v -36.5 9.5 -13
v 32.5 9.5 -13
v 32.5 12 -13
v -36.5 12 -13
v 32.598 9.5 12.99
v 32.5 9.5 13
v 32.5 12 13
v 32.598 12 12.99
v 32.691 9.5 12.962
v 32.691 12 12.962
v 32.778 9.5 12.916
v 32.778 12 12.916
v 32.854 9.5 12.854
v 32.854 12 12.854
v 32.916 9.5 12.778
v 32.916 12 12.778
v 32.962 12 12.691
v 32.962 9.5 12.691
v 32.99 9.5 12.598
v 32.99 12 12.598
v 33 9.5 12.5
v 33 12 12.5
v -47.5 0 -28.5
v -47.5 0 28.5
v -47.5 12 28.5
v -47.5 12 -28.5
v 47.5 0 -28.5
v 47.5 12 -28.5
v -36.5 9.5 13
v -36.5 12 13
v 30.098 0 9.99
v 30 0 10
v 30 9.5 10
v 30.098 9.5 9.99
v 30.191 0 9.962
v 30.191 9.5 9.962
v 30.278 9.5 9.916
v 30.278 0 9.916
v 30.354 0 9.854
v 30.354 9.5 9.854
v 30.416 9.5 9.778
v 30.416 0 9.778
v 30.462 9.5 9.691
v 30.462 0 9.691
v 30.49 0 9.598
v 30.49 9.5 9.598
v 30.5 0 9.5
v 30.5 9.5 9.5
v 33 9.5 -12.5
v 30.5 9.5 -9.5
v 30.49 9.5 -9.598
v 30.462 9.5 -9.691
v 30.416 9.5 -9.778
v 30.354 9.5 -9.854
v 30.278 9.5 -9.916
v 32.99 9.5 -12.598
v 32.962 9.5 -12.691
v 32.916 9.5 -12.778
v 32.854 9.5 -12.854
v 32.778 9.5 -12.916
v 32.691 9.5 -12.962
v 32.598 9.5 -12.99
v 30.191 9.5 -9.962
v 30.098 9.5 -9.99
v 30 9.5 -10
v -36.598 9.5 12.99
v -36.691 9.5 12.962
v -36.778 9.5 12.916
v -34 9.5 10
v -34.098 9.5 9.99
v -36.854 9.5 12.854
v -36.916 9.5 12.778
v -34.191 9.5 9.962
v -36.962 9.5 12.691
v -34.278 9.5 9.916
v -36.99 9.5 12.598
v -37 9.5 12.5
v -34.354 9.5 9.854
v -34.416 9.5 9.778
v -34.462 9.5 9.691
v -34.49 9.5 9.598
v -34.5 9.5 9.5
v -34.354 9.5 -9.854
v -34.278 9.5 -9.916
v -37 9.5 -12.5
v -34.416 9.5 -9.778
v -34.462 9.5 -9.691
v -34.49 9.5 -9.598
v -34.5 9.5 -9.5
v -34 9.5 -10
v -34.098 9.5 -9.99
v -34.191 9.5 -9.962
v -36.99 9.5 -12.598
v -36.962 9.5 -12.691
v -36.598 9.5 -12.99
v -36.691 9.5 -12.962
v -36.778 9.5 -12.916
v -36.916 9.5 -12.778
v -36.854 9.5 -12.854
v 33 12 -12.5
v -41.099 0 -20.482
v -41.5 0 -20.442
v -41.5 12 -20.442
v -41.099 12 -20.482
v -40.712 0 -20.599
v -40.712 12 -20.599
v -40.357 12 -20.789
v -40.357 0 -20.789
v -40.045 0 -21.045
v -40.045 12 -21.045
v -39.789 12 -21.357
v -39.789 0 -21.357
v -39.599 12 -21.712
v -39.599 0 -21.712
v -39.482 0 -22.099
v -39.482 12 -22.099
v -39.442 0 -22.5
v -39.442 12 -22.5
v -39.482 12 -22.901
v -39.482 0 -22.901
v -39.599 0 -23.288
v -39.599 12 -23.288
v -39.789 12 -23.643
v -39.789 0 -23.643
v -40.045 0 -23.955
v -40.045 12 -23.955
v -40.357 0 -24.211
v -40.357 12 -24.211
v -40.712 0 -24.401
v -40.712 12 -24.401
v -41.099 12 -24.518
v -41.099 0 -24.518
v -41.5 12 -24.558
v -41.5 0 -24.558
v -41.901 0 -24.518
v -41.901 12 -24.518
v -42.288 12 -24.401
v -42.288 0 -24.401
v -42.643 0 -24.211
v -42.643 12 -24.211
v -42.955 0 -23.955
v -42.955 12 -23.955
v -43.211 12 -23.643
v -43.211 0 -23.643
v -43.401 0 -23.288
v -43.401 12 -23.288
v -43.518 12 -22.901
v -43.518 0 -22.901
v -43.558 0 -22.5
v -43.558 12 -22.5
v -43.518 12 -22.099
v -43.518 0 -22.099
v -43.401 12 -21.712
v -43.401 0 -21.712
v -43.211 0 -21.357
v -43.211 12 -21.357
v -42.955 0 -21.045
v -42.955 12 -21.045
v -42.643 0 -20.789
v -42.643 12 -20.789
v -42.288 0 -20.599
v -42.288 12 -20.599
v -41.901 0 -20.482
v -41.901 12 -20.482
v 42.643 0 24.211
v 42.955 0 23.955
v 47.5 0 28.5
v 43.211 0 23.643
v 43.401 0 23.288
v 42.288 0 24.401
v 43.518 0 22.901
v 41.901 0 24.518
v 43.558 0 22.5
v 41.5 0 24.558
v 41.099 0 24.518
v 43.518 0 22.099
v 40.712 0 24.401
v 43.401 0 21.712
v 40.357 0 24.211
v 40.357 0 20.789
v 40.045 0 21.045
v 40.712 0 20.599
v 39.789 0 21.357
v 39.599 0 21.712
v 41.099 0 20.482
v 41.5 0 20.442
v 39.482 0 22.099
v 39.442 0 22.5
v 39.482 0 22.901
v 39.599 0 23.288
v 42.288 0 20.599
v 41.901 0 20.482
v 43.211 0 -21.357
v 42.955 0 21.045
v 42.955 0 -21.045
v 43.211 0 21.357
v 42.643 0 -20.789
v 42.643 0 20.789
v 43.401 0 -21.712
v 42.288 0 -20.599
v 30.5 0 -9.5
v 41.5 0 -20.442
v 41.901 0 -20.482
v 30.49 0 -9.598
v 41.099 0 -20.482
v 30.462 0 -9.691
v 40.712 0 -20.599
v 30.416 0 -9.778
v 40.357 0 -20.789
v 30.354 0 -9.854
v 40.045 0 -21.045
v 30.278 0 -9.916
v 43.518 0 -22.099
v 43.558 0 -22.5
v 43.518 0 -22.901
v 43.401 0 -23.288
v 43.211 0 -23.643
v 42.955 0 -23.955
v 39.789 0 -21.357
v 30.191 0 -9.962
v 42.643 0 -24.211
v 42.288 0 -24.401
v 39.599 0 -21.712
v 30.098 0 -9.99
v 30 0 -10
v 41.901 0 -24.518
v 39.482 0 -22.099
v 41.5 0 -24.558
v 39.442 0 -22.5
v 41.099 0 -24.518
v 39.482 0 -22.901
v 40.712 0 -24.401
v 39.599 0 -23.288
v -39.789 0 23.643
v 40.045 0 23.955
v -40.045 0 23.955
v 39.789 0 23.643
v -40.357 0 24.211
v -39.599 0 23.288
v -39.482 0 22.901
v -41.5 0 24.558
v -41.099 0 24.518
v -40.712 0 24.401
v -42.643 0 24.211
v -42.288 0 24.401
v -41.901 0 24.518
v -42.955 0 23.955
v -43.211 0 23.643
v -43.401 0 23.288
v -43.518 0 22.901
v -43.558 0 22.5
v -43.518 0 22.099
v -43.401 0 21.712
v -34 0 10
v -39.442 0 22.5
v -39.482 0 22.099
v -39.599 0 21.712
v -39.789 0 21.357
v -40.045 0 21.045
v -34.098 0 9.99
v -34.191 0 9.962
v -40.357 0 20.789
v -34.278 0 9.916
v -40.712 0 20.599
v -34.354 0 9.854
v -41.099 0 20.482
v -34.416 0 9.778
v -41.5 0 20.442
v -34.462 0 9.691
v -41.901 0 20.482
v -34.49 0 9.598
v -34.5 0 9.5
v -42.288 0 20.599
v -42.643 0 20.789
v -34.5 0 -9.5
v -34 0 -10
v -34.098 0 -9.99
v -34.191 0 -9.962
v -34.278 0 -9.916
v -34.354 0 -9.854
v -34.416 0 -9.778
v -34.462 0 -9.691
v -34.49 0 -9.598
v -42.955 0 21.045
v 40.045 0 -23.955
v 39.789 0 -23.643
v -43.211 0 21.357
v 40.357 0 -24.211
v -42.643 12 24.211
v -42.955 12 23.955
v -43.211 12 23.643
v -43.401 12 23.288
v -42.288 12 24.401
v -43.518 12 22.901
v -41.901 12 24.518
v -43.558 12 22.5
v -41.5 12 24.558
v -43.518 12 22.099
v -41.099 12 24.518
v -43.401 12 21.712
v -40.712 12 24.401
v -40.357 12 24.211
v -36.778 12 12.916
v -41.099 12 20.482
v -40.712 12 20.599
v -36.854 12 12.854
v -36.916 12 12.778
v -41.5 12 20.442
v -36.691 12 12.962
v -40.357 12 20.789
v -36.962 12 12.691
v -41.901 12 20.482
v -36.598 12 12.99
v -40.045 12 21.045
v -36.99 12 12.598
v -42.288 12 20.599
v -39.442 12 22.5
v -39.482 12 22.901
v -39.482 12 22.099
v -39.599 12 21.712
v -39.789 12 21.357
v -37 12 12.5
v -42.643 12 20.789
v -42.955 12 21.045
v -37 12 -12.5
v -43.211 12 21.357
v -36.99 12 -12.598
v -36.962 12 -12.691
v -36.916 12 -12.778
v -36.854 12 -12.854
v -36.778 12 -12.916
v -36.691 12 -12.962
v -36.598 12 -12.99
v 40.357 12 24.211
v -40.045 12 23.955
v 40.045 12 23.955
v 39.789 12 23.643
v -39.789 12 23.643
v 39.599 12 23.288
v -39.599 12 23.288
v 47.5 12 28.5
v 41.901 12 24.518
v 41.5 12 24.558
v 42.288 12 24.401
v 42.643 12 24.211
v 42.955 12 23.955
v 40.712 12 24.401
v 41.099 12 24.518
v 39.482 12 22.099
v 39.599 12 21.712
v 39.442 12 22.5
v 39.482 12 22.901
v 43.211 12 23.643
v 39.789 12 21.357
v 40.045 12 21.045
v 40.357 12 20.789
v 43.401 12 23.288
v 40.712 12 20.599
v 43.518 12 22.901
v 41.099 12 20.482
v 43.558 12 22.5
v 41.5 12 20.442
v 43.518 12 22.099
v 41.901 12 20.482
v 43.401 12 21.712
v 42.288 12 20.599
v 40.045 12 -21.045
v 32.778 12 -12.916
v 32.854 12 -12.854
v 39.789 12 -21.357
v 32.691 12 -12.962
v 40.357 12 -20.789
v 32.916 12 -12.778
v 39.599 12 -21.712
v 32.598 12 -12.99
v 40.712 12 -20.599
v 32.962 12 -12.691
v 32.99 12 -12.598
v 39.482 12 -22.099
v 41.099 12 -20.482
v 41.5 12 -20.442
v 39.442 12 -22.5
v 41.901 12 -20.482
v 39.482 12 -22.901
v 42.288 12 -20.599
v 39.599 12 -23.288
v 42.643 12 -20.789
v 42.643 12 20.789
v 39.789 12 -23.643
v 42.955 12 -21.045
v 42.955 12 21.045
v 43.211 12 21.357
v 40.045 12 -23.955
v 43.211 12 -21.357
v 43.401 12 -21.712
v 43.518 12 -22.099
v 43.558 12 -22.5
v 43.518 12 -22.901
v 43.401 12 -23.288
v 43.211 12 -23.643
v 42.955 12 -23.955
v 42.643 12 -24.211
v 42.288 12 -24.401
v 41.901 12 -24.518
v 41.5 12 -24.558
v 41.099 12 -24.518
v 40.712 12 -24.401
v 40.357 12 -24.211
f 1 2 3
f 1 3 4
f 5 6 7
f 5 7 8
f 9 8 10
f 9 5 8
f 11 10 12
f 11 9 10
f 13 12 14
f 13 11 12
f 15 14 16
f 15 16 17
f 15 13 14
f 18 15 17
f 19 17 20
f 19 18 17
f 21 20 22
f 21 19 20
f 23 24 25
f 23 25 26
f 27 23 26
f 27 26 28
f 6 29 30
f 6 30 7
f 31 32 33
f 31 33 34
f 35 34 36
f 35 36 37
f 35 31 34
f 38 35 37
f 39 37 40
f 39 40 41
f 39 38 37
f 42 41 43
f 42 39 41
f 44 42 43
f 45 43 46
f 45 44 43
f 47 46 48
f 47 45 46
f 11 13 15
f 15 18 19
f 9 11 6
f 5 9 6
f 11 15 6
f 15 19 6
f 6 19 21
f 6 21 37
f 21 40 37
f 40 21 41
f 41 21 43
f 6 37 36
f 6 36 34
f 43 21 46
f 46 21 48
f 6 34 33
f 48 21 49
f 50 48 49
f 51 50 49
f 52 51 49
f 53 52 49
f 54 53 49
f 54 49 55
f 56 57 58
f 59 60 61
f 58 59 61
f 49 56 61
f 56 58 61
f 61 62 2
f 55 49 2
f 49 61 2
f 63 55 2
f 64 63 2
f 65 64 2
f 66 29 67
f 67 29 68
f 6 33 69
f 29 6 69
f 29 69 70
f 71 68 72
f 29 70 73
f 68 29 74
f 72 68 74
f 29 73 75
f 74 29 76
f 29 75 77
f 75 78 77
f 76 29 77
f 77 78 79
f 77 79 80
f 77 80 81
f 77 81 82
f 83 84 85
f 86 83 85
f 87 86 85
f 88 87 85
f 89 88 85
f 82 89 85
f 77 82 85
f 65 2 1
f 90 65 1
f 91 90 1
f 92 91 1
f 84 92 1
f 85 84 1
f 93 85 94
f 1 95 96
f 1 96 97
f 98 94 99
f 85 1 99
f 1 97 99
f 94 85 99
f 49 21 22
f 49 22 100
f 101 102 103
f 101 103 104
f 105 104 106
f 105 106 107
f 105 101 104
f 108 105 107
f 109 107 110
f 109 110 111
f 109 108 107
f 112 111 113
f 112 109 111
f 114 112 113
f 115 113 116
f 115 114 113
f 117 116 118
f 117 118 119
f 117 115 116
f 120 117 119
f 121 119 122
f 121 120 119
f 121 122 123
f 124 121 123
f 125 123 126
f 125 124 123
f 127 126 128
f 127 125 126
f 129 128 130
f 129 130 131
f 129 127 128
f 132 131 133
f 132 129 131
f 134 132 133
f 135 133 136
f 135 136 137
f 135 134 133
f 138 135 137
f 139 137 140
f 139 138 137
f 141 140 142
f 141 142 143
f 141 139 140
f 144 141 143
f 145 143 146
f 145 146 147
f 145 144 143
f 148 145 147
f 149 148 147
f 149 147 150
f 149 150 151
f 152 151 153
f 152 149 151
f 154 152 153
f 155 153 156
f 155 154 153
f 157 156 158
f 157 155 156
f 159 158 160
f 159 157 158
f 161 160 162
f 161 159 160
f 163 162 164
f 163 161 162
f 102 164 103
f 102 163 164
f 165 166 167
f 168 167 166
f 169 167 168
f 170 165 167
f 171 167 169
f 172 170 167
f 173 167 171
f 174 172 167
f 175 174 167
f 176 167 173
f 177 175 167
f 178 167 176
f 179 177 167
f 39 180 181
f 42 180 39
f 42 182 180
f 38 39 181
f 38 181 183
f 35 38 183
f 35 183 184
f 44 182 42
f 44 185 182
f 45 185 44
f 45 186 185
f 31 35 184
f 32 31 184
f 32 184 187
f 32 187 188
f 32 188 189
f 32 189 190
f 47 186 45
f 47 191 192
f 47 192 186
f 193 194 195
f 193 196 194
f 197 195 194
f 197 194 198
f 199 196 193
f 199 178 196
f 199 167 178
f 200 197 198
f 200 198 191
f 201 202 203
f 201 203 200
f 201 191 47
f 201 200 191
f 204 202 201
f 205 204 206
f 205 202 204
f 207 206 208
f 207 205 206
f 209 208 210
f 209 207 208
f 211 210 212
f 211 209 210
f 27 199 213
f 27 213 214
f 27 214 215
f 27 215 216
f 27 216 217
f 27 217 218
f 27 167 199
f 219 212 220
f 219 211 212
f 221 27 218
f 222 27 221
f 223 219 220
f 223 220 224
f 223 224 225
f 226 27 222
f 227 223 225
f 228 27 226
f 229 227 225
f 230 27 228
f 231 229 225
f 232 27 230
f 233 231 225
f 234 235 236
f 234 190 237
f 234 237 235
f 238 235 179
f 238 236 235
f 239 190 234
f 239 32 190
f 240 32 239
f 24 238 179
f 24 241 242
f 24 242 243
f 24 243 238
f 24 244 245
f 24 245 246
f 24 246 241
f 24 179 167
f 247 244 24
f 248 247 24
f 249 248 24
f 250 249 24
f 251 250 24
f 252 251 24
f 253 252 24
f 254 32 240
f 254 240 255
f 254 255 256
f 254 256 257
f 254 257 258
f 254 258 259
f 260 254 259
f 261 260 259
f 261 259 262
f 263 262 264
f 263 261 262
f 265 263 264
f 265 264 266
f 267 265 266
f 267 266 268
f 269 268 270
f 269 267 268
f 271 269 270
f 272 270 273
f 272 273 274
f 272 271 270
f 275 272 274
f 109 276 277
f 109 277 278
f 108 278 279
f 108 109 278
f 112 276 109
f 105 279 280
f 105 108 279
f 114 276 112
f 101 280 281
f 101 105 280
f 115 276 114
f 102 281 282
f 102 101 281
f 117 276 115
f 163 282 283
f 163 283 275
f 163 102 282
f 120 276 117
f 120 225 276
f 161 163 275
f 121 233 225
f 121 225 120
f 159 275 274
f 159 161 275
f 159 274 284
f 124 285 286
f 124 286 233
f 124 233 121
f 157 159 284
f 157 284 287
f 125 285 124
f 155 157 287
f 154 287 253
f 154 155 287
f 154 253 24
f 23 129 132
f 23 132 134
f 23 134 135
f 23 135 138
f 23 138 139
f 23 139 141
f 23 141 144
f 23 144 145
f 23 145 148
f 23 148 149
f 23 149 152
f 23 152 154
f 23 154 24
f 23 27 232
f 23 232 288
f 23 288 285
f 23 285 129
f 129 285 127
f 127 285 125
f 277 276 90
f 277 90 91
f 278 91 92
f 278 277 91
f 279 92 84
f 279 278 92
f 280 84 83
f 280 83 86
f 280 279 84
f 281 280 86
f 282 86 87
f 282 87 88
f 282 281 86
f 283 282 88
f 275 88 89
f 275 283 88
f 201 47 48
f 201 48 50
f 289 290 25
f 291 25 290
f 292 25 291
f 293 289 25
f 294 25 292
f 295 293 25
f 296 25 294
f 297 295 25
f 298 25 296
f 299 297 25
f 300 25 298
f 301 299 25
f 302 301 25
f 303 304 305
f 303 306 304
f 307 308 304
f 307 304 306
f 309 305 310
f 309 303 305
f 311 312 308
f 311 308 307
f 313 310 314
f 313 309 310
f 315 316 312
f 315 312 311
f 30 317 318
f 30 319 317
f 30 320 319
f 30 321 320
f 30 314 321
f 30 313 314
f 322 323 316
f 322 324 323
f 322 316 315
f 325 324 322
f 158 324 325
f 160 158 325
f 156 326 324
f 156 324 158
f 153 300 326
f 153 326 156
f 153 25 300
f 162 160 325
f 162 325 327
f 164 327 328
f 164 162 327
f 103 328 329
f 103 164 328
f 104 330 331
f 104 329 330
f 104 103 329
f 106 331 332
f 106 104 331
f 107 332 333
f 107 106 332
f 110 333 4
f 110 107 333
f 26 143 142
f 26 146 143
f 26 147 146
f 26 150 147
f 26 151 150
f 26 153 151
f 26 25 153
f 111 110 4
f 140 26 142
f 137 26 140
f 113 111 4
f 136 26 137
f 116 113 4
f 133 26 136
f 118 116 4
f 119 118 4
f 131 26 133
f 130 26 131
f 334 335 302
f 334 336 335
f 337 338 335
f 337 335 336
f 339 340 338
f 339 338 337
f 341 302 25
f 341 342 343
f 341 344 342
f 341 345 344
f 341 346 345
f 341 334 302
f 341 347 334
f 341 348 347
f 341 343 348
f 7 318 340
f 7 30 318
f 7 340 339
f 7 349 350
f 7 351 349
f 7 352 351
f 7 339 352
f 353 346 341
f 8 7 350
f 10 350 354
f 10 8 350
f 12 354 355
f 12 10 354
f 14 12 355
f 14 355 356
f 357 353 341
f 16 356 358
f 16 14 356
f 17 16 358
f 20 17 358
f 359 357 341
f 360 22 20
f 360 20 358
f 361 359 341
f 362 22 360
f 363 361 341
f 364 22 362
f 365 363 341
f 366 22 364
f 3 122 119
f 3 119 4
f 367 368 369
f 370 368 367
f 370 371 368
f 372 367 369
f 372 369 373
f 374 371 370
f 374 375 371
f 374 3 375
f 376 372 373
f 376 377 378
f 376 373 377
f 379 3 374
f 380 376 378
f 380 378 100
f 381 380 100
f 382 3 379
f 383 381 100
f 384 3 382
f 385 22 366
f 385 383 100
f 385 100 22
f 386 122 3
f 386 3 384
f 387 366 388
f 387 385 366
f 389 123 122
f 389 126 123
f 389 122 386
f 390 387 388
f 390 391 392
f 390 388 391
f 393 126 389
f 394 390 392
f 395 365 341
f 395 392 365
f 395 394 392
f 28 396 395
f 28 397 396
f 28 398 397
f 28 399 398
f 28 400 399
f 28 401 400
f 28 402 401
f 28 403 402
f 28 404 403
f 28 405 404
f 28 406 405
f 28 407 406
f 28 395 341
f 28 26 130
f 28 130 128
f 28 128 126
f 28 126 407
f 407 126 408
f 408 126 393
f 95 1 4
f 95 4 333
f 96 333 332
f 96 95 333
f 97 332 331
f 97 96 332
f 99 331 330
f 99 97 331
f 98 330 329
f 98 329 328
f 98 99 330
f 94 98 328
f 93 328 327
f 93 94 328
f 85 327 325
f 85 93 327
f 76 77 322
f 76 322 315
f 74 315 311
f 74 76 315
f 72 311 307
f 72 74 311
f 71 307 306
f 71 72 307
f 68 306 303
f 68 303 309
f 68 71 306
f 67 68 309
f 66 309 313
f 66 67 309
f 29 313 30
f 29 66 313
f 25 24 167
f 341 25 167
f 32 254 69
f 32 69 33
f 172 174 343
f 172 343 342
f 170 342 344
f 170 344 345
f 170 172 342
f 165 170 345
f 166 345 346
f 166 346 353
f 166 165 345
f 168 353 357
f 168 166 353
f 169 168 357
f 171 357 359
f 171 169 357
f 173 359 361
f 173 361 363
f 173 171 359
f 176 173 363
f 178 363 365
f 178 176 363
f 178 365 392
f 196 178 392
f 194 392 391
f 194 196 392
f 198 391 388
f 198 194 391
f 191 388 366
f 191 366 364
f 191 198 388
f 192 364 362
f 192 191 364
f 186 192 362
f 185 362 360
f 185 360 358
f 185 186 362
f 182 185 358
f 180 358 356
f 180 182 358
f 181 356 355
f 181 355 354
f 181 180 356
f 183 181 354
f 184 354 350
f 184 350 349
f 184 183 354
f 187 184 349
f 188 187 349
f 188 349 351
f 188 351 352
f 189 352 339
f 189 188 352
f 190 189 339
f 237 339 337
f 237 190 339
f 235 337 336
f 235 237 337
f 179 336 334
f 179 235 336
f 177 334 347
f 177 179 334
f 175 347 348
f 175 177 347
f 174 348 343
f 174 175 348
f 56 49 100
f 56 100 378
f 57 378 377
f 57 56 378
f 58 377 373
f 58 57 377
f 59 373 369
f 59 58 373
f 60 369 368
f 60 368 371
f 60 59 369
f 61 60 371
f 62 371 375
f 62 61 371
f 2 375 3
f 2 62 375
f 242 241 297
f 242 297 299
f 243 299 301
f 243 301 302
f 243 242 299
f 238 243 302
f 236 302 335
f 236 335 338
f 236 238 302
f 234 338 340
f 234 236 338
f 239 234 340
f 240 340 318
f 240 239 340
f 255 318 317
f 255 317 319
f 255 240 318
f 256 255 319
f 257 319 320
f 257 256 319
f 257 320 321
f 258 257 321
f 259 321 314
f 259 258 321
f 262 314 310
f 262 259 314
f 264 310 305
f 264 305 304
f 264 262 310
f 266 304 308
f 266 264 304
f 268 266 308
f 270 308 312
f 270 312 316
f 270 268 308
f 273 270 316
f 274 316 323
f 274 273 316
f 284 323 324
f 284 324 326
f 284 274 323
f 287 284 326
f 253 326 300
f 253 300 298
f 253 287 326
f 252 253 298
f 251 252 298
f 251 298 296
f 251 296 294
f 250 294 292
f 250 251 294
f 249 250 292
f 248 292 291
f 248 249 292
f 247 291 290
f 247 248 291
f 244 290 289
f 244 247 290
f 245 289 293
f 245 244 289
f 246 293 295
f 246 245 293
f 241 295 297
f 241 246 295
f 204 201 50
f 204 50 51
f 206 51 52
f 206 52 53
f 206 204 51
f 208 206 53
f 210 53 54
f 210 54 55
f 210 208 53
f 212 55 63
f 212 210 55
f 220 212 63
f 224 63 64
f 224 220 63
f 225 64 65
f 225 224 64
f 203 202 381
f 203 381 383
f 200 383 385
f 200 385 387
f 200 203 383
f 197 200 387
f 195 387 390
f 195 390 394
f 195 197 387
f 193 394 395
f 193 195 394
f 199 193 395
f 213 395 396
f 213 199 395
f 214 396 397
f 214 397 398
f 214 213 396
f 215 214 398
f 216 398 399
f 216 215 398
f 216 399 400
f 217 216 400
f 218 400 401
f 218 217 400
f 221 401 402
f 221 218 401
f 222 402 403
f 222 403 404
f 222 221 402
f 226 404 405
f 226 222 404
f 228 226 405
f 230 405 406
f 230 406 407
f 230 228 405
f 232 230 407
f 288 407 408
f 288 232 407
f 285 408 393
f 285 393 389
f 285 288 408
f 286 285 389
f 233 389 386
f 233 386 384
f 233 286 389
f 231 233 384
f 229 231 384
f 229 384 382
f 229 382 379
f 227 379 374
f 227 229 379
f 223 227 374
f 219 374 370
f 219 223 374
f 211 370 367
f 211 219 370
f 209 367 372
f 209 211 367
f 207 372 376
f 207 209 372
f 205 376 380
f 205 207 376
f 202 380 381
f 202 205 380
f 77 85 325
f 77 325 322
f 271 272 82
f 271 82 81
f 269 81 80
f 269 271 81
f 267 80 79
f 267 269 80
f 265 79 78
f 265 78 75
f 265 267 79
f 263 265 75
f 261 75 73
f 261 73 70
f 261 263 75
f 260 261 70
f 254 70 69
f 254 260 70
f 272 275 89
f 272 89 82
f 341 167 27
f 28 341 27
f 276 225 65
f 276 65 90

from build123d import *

# Parameters (mm, degrees)
SKETCH1_W           = 95
SKETCH1_H           = 57
SKETCH1_R           = 2.057983022
BOSS_EXTRUDE2_DEPTH = 12
BOSS_EXTRUDE3_DEPTH = 9.5


with BuildPart() as part:
    # Sketch1 → Boss-Extrude2 (new body)
    with BuildSketch(Plane(origin=(0, 0, 0), x_dir=(1, 0, 0), z_dir=(0, 1, 0))):
        Rectangle(SKETCH1_W, SKETCH1_H)
        with Locations((-41.5, -22.5)):
            Circle(SKETCH1_R, mode=Mode.SUBTRACT)
        with Locations((41.5, -22.5)):
            Circle(SKETCH1_R, mode=Mode.SUBTRACT)
        with BuildLine():
            Line((-36.5, 13), (32.5, 13))
            ThreePointArc((32.5, 13), (32.853553391, 12.853553391), (33, 12.5))
            Line((33, 12.5), (33, -12.5))
            ThreePointArc((33, -12.5), (32.853553391, -12.853553391), (32.5, -13))
            Line((32.5, -13), (-36.5, -13))
            ThreePointArc((-36.5, -13), (-36.853553391, -12.853553391), (-37, -12.5))
            Line((-37, -12.5), (-37, 12.5))
            ThreePointArc((-37, 12.5), (-36.853553391, 12.853553391), (-36.5, 13))
        make_face(mode=Mode.SUBTRACT)
        with Locations((-41.5, 22.5)):
            Circle(SKETCH1_R, mode=Mode.SUBTRACT)
        with Locations((41.5, 22.5)):
            Circle(SKETCH1_R, mode=Mode.SUBTRACT)
    extrude(amount=BOSS_EXTRUDE2_DEPTH)

    # Sketch1<5> → Boss-Extrude3 (add)
    with BuildSketch(Plane(origin=(0, 0, 0), x_dir=(1, 0, 0), z_dir=(0, 1, 0))):
        with BuildLine():
            ThreePointArc((33, 12.5), (32.853553391, 12.853553391), (32.5, 13))
            Line((32.5, 13), (-36.5, 13))
            ThreePointArc((-36.5, 13), (-36.853553391, 12.853553391), (-37, 12.5))
            Line((-37, 12.5), (-37, -12.5))
            ThreePointArc((-37, -12.5), (-36.853553391, -12.853553391), (-36.5, -13))
            Line((-36.5, -13), (32.5, -13))
            ThreePointArc((32.5, -13), (32.853553391, -12.853553391), (33, -12.5))
            Line((33, -12.5), (33, 12.5))
        make_face()
        with BuildLine():
            ThreePointArc((30.5, -9.5), (30.353553391, -9.853553391), (30, -10))
            Line((30, -10), (-34, -10))
            ThreePointArc((-34, -10), (-34.353553391, -9.853553391), (-34.5, -9.5))
            Line((-34.5, -9.5), (-34.5, 9.5))
            ThreePointArc((-34.5, 9.5), (-34.353553391, 9.853553391), (-34, 10))
            Line((-34, 10), (30, 10))
            ThreePointArc((30, 10), (30.353553391, 9.853553391), (30.5, 9.5))
            Line((30.5, 9.5), (30.5, -9.5))
        make_face(mode=Mode.SUBTRACT)
    extrude(amount=BOSS_EXTRUDE3_DEPTH)


solid = part.part
